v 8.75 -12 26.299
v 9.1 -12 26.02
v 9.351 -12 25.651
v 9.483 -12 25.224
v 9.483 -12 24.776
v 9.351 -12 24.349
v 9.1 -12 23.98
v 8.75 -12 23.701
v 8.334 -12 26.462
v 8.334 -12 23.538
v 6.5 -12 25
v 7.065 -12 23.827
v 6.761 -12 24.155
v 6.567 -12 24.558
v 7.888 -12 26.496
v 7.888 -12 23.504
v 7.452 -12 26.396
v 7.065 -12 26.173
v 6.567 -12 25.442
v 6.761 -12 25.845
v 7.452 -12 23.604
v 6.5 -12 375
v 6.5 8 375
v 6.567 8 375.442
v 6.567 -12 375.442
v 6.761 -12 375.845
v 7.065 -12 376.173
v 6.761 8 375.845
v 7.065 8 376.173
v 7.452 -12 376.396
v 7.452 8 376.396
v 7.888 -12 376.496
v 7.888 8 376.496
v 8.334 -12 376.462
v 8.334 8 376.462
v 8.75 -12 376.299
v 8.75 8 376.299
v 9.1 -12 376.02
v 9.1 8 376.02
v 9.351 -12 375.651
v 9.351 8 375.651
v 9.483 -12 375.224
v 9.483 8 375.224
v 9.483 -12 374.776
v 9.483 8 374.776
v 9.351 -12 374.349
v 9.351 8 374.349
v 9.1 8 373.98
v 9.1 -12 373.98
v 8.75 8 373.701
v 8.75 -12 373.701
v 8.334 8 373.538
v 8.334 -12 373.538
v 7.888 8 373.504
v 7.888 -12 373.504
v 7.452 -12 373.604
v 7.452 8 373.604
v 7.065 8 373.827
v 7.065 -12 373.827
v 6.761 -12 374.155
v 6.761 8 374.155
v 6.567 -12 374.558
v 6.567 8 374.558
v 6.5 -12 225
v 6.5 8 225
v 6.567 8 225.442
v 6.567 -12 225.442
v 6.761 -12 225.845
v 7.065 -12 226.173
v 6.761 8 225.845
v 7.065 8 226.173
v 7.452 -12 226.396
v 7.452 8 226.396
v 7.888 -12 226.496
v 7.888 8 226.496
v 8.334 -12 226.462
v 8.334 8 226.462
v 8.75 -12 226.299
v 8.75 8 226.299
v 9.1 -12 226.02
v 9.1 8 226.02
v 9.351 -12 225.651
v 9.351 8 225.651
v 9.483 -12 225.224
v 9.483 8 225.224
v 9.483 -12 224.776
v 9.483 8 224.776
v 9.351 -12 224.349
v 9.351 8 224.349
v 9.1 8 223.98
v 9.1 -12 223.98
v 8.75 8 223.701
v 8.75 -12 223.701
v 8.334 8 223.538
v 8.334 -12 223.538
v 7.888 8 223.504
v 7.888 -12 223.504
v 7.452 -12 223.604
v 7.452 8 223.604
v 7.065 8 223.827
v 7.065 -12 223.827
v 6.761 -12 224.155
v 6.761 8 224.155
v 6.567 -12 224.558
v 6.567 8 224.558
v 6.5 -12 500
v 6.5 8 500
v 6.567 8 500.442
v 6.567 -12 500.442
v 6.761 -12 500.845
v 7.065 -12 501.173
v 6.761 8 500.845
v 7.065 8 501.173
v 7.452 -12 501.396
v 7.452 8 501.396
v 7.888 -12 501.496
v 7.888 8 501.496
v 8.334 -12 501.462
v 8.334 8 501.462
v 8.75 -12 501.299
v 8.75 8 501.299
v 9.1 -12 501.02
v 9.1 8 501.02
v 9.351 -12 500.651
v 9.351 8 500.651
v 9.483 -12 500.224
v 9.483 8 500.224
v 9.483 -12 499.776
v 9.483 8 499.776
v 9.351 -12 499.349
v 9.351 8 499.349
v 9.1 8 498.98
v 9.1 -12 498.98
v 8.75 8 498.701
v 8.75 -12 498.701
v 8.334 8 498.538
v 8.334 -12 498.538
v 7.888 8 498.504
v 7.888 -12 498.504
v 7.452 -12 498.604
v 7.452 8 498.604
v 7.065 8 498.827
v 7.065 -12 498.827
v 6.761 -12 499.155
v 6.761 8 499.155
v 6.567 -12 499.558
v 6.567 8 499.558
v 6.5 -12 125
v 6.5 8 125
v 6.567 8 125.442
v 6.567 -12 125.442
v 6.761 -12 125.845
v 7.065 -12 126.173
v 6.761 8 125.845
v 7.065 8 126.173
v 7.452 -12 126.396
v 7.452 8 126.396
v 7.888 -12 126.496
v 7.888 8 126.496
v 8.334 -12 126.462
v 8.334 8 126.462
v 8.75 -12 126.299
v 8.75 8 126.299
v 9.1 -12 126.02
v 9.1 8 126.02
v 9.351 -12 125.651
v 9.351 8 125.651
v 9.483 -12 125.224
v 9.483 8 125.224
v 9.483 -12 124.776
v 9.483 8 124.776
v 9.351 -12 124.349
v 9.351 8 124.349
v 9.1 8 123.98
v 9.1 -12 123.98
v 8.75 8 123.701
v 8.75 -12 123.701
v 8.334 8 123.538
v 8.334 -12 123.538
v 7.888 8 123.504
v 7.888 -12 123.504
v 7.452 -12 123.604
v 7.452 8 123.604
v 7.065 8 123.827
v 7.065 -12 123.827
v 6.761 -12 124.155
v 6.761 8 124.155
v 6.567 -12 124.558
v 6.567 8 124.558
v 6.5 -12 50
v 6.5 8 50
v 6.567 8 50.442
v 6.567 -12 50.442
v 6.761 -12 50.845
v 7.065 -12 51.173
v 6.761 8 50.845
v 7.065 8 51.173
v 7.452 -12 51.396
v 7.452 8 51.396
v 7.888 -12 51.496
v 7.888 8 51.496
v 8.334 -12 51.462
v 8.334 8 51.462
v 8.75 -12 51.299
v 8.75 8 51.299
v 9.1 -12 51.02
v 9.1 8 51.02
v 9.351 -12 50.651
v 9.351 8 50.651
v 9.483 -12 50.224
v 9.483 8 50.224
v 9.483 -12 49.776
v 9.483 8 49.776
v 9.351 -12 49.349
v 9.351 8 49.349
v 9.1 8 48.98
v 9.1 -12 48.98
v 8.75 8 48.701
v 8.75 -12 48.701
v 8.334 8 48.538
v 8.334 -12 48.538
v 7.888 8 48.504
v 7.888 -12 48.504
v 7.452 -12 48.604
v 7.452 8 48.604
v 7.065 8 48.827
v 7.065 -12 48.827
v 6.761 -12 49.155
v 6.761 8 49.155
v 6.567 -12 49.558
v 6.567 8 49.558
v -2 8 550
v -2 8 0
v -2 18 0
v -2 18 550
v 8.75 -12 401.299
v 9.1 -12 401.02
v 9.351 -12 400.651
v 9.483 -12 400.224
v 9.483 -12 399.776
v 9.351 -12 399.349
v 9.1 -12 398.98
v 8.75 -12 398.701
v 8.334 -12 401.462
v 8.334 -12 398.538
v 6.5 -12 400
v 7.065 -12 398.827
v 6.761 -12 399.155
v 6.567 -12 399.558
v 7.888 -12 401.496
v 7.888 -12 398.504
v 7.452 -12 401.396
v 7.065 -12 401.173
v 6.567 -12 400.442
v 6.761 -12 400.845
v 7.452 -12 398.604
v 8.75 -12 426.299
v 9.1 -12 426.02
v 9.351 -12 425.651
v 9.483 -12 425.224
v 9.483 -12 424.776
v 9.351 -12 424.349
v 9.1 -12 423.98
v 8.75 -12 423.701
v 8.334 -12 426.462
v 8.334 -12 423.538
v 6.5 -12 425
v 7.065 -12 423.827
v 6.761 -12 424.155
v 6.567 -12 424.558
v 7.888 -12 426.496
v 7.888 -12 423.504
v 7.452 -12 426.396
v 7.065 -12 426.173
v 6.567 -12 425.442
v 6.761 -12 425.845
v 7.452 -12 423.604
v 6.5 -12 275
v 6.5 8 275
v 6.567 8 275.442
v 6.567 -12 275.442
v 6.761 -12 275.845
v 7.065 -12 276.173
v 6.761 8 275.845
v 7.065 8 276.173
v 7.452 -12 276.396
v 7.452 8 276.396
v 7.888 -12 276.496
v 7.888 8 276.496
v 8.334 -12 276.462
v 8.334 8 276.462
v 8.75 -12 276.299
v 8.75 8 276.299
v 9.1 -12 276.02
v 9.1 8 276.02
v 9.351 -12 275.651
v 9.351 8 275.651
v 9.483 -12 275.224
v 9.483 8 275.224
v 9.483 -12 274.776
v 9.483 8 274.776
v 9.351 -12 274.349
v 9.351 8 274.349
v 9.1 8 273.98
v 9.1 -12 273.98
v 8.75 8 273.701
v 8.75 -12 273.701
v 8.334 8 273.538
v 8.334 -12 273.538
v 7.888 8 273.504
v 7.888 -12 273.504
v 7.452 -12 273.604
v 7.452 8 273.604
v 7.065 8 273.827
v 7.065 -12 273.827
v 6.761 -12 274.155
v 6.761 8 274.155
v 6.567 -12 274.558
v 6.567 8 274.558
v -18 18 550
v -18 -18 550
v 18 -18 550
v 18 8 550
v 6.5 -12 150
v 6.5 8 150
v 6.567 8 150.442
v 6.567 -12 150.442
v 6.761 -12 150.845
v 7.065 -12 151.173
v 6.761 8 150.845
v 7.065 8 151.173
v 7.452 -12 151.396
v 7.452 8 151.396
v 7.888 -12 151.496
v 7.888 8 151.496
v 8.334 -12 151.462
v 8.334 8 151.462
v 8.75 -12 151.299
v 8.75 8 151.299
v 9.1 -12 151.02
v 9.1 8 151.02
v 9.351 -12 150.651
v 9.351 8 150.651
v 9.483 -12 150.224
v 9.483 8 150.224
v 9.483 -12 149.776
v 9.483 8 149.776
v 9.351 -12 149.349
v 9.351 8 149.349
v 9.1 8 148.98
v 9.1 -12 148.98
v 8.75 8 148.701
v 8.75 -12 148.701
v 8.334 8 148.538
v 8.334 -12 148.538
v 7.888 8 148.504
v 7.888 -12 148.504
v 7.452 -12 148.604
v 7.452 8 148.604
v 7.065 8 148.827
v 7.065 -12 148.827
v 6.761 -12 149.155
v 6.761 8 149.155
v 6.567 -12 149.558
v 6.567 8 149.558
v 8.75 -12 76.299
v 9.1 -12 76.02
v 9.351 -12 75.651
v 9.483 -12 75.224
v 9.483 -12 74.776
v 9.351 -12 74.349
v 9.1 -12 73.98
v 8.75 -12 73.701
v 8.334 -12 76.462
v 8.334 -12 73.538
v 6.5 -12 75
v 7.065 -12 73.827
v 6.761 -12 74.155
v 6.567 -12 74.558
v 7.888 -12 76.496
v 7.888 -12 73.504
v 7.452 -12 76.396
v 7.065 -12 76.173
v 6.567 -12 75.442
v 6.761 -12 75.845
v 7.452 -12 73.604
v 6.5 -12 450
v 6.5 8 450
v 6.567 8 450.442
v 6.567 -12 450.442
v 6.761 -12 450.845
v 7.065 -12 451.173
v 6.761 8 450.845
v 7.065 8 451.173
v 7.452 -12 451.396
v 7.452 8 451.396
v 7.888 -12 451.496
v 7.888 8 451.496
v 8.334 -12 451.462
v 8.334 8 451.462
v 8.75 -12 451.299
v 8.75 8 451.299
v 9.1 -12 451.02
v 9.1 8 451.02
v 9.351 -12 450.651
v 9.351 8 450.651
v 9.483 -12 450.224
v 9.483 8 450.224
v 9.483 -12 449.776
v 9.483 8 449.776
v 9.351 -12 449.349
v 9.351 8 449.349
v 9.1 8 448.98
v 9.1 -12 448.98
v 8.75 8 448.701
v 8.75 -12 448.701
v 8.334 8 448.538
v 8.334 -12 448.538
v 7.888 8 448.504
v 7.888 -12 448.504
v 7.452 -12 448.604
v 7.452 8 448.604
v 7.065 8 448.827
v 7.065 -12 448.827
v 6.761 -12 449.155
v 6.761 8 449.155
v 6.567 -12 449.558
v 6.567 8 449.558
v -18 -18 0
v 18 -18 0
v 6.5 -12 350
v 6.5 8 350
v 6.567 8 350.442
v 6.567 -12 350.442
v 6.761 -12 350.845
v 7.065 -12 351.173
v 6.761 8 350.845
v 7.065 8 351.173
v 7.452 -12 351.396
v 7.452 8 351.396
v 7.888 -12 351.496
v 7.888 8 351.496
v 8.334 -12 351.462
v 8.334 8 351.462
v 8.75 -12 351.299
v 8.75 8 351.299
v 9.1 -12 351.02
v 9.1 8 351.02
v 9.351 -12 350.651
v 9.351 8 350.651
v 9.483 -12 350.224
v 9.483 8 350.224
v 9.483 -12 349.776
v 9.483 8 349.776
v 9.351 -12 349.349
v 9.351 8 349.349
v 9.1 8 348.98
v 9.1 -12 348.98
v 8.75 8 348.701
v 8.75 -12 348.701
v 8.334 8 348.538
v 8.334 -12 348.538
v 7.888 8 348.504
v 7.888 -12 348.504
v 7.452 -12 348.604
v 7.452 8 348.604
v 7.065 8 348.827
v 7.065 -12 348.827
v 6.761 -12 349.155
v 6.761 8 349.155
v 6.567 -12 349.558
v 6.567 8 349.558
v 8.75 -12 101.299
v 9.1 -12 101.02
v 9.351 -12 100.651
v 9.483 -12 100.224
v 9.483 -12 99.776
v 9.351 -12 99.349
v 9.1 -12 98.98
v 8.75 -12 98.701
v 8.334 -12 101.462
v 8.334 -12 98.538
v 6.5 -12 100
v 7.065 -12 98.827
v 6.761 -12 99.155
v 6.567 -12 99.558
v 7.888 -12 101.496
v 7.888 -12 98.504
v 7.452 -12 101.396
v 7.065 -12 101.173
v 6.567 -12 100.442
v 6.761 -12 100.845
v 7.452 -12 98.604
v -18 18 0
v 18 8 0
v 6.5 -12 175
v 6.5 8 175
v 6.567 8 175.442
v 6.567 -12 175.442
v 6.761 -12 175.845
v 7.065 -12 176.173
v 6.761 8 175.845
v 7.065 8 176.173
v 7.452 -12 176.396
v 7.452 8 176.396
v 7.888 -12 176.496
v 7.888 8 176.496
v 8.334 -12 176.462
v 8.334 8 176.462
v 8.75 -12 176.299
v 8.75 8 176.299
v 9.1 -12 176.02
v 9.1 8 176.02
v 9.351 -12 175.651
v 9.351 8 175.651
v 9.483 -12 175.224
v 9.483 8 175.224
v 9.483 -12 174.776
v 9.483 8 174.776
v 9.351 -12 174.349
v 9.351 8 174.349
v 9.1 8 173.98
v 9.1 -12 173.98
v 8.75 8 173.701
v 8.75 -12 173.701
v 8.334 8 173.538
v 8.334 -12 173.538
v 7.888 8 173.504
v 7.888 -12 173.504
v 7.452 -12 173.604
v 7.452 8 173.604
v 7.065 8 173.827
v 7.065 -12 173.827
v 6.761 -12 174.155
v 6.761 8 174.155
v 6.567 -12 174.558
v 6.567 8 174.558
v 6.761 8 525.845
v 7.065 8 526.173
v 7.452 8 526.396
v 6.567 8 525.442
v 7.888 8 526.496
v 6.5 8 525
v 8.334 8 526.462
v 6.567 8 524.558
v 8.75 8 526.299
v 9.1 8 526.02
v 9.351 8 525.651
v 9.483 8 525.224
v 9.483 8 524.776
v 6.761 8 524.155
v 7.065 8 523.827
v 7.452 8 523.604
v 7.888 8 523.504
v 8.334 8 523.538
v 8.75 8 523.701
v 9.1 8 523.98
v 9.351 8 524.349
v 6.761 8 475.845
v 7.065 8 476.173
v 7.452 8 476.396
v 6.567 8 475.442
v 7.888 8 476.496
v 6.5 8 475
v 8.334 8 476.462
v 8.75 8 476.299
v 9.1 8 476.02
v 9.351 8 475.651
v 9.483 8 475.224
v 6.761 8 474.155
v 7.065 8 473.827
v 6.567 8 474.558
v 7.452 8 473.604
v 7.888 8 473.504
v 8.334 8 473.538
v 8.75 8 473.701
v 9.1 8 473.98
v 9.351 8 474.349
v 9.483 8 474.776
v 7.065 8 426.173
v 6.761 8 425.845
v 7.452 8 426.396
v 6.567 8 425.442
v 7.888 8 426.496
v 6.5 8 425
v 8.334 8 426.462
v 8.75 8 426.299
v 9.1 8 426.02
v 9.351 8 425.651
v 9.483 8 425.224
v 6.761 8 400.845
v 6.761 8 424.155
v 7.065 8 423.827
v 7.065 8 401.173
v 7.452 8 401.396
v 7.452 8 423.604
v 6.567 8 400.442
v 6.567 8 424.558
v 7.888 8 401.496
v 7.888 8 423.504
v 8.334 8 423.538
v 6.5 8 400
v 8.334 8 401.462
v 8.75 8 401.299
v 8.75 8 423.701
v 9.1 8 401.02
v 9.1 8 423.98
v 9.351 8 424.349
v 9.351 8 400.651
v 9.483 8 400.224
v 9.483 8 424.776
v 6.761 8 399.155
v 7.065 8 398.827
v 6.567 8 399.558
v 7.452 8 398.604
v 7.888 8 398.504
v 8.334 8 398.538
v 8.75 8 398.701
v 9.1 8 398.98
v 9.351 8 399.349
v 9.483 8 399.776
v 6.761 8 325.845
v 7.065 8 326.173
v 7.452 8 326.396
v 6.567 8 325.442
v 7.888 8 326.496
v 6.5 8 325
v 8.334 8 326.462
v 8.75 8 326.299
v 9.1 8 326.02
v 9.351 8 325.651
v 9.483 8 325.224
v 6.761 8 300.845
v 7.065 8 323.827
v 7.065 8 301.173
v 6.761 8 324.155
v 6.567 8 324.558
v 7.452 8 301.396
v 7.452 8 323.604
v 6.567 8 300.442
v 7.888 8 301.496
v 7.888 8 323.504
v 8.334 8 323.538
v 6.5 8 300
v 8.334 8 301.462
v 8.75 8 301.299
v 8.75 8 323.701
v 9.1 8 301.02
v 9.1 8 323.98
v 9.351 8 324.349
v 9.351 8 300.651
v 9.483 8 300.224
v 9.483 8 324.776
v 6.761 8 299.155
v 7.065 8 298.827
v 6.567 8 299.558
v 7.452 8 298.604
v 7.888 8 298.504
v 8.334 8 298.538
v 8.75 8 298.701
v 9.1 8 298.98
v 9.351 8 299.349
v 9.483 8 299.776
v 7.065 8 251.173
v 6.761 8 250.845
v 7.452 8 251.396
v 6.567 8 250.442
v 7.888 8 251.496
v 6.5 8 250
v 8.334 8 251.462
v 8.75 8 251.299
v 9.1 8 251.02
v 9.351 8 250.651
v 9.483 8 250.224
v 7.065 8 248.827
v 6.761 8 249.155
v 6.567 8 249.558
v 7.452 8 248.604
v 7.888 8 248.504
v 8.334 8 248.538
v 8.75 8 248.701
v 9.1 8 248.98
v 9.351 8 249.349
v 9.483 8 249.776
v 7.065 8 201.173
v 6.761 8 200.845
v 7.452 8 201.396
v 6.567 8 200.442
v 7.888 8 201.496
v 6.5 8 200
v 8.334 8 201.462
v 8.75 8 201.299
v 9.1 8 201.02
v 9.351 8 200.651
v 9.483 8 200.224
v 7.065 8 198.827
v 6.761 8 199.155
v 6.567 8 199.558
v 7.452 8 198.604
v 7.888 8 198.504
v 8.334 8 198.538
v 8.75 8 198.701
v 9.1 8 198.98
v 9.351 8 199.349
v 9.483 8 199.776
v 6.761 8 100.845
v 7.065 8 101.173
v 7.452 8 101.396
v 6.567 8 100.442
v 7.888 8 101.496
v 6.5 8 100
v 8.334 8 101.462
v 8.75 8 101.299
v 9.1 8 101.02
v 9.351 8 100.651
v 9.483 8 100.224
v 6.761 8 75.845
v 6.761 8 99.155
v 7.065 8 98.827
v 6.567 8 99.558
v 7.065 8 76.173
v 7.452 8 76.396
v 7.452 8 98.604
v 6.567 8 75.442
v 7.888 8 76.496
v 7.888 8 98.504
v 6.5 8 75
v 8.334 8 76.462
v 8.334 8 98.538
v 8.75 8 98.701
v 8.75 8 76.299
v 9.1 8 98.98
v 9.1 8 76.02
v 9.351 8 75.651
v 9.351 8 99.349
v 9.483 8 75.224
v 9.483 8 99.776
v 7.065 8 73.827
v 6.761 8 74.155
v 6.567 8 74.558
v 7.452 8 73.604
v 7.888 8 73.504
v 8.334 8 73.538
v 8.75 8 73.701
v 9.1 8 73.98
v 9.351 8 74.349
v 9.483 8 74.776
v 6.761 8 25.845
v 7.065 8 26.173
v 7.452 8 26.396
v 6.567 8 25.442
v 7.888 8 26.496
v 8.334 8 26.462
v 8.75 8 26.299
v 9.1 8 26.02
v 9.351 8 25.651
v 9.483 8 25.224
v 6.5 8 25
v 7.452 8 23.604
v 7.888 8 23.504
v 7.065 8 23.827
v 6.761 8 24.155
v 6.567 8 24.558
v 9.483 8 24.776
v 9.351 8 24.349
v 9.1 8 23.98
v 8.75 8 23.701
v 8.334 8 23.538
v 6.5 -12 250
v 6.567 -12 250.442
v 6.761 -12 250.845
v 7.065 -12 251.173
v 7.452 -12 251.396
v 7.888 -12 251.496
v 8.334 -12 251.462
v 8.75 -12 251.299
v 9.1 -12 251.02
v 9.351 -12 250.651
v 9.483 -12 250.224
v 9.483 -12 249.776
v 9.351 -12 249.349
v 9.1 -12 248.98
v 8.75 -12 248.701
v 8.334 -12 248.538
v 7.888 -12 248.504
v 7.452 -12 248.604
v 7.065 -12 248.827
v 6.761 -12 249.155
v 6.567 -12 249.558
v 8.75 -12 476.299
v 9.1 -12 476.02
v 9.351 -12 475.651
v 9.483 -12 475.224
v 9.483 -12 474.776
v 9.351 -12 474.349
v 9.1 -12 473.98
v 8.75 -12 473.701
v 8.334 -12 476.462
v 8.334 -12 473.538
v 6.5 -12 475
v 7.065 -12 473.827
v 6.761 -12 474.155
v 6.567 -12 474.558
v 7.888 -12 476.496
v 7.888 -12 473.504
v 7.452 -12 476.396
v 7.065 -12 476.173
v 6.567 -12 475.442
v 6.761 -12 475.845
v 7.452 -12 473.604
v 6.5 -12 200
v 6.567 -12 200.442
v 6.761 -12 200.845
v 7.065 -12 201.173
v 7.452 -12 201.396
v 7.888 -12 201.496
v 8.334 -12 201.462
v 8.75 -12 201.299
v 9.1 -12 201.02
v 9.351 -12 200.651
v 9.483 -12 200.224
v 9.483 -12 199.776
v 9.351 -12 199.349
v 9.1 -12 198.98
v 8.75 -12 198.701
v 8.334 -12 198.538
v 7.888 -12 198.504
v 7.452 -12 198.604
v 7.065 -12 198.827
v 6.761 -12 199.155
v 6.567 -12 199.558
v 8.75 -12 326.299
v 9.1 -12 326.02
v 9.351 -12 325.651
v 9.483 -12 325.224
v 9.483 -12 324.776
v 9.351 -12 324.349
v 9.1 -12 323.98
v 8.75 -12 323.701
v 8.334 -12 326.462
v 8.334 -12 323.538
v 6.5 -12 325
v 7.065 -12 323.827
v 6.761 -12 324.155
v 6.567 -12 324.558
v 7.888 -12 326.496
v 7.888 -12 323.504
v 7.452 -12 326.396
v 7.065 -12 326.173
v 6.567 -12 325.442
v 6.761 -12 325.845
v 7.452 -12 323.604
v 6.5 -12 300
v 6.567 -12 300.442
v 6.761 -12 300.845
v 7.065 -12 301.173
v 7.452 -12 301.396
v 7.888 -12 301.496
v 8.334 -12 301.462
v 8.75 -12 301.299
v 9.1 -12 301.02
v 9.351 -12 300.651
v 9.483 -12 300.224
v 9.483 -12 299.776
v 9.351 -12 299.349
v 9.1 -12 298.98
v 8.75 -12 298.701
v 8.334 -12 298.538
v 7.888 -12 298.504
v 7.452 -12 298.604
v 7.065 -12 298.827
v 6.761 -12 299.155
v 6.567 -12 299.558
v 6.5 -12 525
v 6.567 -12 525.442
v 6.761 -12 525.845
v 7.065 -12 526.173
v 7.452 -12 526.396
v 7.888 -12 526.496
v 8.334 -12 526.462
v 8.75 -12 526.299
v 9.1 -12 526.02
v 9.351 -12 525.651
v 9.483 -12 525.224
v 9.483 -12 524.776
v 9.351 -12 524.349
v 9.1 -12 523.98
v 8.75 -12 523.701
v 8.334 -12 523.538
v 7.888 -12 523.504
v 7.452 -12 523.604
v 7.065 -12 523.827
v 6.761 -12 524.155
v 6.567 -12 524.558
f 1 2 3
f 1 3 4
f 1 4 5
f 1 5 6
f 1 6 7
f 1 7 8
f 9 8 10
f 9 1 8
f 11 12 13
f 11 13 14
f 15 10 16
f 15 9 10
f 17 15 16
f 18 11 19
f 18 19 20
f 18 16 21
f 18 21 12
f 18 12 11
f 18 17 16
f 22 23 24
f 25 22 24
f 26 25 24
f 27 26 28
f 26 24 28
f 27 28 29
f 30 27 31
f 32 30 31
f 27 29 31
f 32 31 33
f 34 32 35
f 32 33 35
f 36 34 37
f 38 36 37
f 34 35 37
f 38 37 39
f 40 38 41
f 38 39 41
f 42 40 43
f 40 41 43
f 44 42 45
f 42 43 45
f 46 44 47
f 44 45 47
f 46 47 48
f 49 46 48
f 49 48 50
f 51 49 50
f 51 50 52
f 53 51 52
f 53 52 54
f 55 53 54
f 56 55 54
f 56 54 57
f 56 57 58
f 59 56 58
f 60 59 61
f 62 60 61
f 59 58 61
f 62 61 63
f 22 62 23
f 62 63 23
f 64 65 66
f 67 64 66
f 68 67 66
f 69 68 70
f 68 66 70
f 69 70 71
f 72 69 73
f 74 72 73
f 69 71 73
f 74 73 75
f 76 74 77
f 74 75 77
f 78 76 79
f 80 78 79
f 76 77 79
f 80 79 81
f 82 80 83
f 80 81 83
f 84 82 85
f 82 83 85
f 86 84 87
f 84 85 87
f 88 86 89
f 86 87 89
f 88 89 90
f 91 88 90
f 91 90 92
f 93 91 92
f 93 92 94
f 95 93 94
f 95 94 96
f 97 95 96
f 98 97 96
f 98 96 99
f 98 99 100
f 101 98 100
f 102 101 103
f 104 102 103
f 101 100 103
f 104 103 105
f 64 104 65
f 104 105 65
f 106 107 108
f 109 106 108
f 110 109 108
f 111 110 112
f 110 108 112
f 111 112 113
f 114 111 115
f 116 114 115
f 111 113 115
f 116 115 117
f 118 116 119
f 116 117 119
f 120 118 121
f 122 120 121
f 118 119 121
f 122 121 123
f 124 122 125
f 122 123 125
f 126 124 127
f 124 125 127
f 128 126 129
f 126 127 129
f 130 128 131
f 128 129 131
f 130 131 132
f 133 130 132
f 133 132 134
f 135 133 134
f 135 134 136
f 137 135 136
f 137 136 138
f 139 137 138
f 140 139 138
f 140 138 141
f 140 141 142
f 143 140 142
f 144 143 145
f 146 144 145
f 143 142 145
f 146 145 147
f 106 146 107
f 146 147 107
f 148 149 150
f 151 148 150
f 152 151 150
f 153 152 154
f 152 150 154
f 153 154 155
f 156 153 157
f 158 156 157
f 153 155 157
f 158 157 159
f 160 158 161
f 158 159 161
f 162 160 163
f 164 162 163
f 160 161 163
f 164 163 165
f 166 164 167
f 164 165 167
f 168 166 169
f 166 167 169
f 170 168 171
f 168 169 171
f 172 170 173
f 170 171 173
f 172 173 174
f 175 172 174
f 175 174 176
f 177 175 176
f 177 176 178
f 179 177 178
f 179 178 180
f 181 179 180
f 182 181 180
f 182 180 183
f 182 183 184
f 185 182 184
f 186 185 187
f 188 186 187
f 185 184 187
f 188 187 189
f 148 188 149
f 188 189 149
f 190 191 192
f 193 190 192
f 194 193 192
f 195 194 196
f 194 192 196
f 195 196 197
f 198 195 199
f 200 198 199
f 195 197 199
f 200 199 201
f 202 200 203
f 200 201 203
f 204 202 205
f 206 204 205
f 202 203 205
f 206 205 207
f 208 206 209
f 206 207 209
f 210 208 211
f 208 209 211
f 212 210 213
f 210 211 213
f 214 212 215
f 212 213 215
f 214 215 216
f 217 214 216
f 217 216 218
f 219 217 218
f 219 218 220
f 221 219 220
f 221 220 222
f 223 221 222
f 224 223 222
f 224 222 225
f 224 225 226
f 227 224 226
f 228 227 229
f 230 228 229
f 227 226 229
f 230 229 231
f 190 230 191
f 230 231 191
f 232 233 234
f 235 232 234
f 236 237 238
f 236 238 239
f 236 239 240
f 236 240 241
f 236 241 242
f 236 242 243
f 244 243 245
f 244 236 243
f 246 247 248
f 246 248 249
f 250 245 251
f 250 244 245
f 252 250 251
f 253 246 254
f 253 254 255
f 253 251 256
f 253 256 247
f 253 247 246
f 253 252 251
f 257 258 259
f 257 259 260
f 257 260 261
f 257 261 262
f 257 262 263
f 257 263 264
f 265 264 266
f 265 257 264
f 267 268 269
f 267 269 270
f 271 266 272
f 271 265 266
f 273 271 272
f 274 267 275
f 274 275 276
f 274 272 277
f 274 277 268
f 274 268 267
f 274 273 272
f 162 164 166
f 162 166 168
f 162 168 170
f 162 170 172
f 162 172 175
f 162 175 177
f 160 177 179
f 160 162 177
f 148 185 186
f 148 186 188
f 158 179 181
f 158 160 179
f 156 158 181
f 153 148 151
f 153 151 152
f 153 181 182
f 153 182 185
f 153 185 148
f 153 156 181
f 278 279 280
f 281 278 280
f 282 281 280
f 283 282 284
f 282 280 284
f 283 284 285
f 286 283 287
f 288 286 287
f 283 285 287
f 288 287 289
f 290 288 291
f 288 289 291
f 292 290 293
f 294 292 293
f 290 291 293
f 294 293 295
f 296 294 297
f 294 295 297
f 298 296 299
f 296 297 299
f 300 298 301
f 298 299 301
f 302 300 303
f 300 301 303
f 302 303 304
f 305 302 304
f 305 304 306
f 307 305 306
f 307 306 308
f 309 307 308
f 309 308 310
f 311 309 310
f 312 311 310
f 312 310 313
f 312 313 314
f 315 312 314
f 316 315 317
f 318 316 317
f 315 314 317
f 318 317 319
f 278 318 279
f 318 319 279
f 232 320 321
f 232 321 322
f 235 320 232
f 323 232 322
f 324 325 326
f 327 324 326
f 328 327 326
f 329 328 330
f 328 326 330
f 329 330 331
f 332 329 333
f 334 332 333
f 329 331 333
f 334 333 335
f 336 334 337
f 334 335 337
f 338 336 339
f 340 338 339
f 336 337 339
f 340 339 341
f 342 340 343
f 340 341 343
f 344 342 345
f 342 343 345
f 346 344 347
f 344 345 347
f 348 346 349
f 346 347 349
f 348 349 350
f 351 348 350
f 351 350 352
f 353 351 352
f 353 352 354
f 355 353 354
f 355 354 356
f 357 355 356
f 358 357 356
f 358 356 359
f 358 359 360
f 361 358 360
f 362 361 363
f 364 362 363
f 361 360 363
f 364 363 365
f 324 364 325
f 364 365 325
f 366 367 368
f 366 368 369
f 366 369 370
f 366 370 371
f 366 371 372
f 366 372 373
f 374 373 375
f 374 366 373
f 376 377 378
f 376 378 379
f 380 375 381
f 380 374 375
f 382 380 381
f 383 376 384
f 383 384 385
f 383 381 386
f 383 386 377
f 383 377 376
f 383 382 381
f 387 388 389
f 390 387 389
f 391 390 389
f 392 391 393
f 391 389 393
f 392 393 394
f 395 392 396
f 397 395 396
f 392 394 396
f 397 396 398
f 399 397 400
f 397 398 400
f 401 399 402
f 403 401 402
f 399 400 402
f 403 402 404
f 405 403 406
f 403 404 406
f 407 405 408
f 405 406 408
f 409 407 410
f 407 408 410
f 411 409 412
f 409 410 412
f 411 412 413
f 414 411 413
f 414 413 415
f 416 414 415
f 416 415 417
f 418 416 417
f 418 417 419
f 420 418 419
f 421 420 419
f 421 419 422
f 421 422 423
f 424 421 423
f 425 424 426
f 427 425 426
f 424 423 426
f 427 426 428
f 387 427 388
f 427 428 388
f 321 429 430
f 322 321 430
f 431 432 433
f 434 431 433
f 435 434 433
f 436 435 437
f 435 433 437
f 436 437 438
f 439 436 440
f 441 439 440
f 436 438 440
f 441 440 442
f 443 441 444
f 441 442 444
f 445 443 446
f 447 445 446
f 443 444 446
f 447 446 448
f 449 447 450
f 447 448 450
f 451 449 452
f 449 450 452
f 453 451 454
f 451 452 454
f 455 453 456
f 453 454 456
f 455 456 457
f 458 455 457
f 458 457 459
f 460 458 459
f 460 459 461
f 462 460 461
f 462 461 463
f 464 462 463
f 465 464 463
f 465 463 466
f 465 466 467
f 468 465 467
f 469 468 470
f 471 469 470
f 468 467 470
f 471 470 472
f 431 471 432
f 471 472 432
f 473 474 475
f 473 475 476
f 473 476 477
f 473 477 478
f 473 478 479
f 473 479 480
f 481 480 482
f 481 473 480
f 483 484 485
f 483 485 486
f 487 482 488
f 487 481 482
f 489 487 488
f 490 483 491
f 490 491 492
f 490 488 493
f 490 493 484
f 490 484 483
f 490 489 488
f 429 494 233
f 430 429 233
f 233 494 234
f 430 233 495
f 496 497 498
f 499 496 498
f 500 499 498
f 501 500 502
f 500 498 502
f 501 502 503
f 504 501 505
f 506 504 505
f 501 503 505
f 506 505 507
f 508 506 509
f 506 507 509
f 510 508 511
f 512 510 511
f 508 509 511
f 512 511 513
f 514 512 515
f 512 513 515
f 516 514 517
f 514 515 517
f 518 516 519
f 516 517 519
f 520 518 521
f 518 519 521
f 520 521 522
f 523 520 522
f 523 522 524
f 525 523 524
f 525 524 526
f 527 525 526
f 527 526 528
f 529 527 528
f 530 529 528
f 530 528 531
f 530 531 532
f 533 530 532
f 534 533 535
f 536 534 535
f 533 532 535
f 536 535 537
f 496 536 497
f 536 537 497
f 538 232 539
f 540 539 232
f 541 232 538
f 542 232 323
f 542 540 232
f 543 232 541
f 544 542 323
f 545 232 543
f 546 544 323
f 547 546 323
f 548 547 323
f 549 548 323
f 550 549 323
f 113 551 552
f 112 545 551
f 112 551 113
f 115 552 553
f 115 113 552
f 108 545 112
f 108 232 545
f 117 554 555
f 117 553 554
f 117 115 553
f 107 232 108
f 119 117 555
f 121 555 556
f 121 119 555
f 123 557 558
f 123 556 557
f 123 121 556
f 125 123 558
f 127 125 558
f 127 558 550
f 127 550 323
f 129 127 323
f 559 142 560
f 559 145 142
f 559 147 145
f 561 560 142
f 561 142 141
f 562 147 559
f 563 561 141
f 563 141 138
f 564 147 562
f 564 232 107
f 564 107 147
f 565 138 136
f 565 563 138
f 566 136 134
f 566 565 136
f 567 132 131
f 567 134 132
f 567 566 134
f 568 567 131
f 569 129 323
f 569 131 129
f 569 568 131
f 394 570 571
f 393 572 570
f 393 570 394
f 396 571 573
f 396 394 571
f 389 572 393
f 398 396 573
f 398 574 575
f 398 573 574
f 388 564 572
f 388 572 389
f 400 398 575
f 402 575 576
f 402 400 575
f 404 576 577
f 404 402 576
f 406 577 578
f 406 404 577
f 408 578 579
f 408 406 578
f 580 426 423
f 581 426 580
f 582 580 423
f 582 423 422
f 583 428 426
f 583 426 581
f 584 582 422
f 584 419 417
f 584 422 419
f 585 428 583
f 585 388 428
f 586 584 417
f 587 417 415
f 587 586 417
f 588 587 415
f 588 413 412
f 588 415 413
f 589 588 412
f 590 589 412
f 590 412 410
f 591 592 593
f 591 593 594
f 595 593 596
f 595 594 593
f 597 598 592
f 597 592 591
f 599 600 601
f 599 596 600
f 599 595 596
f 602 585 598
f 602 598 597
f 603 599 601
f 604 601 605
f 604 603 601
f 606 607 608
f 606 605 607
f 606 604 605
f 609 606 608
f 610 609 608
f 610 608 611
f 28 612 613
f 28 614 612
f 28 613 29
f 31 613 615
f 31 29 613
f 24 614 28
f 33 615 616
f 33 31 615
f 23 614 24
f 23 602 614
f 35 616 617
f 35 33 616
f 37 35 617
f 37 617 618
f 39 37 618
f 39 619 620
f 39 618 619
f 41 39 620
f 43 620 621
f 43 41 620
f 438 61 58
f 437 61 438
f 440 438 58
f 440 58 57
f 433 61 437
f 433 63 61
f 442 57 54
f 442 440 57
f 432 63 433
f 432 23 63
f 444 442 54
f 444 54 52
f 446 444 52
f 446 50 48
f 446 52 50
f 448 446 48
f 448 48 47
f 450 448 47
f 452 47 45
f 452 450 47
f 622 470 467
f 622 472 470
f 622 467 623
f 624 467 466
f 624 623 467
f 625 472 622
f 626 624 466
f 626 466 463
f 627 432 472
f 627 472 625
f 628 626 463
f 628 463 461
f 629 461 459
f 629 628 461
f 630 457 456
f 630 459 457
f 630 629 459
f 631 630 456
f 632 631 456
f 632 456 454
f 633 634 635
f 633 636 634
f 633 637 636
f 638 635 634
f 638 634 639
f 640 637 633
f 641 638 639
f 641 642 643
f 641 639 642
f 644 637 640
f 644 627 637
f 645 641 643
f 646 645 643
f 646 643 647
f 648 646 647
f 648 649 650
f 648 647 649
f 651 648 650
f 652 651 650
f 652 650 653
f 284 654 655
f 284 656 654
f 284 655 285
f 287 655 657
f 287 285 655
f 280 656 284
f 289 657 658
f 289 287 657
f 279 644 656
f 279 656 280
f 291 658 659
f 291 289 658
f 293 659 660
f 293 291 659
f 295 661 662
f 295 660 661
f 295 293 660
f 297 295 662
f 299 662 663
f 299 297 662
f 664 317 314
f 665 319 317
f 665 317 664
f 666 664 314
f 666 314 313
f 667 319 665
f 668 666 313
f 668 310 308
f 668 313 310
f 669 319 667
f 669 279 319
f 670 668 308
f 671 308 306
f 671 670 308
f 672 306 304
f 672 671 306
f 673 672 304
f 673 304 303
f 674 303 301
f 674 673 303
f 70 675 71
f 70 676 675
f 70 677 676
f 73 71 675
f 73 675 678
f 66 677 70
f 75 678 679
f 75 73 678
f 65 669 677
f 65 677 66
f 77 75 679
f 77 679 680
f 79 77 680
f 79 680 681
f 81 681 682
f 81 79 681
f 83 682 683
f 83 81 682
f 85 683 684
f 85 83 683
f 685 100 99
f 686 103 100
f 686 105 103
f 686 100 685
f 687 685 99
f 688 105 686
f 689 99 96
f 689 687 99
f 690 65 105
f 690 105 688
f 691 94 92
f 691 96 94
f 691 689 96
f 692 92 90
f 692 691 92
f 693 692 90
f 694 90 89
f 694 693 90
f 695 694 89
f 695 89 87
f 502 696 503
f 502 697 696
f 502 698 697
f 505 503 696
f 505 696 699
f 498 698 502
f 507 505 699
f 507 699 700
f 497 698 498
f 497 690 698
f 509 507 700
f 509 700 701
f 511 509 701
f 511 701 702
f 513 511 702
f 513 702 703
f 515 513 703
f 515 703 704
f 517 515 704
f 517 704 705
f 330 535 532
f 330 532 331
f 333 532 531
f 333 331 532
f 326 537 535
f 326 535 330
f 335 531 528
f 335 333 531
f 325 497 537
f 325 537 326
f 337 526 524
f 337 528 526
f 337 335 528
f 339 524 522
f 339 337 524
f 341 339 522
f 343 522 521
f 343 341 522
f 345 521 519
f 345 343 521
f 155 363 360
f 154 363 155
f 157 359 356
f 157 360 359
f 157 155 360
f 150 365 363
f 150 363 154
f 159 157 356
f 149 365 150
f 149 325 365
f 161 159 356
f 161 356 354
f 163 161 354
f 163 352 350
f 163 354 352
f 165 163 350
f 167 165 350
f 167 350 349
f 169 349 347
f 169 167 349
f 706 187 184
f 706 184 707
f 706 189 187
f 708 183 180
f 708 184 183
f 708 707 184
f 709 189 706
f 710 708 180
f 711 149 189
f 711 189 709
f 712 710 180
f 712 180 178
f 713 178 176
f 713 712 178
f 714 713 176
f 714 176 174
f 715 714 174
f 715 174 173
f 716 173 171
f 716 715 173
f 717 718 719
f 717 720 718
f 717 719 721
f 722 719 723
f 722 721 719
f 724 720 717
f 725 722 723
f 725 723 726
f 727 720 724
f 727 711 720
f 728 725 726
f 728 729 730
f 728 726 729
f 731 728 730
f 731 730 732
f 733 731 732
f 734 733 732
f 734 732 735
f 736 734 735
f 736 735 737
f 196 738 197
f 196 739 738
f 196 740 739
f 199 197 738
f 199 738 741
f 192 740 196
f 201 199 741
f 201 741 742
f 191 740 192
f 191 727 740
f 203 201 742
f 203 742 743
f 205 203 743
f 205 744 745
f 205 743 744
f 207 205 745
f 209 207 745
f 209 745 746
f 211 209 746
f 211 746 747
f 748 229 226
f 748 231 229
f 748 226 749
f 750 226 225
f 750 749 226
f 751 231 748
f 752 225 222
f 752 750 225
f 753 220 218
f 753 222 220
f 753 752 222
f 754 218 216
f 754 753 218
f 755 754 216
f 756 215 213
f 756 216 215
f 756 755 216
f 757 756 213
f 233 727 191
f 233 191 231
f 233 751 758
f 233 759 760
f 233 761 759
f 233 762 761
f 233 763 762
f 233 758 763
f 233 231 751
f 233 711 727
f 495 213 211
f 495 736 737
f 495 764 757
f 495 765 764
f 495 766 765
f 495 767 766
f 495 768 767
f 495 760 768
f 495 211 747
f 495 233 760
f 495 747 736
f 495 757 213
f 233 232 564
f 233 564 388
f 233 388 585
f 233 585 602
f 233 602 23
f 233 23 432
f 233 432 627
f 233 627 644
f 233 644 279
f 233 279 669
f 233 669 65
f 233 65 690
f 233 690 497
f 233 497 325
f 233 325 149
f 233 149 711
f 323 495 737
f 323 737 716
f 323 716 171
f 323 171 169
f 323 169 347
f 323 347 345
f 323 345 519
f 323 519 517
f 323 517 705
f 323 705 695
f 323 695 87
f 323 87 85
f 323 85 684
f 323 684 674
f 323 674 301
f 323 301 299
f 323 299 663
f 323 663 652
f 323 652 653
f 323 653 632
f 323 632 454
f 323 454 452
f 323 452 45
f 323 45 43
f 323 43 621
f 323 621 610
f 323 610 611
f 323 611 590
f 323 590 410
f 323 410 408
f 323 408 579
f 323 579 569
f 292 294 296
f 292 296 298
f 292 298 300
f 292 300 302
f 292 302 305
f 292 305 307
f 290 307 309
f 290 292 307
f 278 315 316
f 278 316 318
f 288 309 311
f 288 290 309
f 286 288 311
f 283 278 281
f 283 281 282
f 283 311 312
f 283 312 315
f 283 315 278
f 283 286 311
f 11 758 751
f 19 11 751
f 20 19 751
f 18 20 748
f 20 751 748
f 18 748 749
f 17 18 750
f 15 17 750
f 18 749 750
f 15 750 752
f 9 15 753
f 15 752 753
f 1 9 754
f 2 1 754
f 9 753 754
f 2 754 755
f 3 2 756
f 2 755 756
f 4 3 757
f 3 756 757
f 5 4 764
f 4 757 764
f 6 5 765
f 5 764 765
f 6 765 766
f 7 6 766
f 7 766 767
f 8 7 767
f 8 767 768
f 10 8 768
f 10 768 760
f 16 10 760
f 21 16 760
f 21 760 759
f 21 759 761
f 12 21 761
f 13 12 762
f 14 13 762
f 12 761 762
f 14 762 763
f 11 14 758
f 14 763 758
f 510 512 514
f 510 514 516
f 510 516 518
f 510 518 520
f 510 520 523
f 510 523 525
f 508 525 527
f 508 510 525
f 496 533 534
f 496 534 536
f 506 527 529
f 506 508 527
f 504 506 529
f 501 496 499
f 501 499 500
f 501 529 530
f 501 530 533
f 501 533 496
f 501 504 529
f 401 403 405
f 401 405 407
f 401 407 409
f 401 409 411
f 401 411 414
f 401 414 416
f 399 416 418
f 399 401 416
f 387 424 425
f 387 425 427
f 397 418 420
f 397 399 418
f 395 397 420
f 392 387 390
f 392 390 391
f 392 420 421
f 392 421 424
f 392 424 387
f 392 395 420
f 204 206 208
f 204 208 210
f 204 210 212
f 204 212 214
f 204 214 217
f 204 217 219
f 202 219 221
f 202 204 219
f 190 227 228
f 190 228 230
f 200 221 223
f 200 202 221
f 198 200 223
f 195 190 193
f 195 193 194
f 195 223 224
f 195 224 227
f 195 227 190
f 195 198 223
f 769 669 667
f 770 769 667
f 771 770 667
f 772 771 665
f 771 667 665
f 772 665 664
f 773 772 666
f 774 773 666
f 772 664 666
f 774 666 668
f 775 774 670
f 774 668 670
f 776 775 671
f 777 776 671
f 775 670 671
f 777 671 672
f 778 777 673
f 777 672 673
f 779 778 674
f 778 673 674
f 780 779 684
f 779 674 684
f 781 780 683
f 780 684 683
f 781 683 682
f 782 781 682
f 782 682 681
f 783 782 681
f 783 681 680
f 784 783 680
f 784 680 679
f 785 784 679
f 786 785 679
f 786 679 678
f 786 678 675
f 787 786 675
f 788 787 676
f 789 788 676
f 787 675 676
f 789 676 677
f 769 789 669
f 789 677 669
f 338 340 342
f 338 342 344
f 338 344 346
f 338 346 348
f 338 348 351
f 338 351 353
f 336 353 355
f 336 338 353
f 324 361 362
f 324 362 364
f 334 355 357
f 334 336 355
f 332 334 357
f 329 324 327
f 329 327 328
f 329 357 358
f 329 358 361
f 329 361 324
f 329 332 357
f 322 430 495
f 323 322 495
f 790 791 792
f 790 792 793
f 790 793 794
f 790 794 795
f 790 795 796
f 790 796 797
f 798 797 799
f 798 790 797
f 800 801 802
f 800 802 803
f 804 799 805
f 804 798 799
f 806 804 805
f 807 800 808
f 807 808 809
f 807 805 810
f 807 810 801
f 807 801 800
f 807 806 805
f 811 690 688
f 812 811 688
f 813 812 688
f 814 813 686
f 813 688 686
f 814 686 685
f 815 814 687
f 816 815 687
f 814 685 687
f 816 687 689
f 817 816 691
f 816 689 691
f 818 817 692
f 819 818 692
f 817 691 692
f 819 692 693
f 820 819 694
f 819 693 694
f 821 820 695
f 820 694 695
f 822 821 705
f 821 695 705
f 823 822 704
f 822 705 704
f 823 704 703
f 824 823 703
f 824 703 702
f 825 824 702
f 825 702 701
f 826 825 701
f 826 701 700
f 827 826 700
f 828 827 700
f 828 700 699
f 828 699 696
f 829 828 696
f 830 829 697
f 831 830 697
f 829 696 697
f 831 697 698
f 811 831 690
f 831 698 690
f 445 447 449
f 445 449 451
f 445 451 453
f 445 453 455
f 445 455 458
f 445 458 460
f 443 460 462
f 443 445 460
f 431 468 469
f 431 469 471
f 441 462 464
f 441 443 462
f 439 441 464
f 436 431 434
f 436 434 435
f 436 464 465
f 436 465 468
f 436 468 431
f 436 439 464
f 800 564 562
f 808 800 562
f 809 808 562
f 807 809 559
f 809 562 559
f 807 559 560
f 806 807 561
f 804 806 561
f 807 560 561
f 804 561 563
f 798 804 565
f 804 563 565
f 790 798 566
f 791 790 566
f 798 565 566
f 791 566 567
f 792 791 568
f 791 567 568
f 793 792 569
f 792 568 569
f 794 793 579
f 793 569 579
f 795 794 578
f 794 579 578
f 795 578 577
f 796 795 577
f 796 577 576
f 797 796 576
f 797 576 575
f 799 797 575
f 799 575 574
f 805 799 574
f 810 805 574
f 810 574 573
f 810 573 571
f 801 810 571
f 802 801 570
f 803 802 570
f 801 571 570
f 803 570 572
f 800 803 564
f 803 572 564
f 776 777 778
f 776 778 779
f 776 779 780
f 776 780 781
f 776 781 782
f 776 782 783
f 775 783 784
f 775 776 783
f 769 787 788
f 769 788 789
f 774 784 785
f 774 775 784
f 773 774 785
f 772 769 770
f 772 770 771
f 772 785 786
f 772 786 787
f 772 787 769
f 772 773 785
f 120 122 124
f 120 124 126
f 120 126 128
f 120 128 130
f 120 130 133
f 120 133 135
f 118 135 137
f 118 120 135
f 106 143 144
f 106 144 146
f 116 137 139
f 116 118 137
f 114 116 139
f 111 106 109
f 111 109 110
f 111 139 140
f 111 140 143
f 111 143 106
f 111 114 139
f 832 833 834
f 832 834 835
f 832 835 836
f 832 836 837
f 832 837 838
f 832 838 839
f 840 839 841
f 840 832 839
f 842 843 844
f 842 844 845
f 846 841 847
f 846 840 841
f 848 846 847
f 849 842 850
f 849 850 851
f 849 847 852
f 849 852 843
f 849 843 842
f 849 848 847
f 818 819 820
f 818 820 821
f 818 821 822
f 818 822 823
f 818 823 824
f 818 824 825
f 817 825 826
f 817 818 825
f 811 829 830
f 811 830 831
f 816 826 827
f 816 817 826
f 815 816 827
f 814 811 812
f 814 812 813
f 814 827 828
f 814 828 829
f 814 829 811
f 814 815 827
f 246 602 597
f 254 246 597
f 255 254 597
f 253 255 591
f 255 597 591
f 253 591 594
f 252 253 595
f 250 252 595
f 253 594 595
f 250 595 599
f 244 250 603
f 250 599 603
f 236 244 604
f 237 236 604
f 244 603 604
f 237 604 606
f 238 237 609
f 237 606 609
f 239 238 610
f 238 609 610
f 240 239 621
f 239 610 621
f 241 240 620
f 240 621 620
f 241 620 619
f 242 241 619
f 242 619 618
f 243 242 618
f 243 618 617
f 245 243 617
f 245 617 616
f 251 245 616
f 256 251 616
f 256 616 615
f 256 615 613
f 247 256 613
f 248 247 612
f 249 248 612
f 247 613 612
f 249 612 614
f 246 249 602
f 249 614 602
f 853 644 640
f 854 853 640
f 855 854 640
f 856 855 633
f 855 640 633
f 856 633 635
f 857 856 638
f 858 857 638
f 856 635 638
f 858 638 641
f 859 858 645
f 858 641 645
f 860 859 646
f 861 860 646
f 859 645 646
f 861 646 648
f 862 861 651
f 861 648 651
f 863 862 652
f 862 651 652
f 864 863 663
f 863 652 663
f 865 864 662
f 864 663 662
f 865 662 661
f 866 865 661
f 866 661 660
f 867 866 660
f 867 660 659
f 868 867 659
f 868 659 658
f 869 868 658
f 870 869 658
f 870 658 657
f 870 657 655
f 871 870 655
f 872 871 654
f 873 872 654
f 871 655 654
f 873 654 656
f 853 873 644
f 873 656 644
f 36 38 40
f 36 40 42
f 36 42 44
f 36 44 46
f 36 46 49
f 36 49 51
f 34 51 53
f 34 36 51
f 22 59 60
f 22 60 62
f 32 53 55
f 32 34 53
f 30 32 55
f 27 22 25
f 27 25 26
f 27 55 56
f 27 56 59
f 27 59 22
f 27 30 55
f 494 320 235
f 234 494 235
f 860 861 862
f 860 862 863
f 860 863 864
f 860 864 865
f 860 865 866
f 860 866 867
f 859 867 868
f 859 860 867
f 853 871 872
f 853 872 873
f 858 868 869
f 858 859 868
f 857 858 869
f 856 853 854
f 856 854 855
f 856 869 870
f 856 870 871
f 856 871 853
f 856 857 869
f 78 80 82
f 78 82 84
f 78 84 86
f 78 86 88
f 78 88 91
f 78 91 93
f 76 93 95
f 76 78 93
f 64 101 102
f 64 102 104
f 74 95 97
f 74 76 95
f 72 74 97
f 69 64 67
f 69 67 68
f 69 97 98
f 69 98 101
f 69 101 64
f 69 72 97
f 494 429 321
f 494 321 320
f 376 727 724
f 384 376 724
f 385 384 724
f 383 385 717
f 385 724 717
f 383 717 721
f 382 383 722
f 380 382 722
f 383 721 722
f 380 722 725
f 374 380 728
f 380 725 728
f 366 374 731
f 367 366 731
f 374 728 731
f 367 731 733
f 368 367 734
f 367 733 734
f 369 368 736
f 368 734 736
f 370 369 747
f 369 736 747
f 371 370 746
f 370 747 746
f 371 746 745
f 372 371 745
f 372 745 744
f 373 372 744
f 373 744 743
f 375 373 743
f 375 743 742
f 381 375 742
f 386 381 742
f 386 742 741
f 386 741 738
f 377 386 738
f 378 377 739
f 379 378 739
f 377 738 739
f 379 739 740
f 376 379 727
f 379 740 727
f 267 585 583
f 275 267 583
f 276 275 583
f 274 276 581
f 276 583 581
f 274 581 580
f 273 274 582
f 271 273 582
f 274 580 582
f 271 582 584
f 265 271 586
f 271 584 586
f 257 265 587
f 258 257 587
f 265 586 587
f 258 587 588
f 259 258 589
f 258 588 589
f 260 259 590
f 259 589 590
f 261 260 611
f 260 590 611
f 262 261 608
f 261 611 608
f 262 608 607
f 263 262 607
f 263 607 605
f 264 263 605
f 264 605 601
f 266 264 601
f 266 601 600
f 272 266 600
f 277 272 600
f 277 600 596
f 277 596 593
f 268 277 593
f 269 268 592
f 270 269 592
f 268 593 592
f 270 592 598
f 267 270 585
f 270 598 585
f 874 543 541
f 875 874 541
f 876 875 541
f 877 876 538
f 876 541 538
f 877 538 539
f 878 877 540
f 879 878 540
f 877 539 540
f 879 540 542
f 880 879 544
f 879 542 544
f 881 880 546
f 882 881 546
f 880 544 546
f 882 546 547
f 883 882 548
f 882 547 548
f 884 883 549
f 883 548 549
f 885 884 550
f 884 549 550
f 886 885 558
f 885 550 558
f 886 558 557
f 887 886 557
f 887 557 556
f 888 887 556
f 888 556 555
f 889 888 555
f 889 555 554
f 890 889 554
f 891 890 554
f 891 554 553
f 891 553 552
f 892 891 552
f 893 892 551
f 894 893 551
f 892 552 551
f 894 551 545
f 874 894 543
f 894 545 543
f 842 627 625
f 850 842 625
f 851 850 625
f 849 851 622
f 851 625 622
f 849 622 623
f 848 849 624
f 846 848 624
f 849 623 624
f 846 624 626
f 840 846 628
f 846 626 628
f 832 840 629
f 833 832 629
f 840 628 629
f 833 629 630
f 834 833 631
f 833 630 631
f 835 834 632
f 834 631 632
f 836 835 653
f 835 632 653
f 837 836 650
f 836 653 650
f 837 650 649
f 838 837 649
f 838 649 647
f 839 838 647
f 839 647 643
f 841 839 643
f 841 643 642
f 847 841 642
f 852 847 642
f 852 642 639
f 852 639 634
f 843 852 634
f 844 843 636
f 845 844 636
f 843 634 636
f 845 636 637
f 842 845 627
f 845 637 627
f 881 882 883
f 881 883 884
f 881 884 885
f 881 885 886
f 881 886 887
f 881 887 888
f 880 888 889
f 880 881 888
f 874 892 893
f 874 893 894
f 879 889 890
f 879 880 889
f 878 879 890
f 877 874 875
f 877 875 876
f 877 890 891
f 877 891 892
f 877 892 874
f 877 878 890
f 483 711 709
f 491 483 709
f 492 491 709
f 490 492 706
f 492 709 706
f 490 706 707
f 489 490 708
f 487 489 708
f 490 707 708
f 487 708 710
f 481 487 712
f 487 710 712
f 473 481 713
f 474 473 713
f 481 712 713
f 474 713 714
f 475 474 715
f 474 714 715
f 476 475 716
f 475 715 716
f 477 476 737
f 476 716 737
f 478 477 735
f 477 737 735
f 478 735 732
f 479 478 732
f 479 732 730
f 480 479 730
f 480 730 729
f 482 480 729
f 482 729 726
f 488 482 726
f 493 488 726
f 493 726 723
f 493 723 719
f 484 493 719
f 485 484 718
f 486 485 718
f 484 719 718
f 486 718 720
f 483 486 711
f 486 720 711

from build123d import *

# Parameters (mm, degrees)
ESQUISSE1_W                    = 36
ESQUISSE1_H                    = 36
BOSS_EXTRU_1_DEPTH             = 550
ENL_V_MAT_EXTRU_1_DEPTH        = 551.588775766
ENL_V_MAT_EXTRU_1_DEPTH_BACK   = 551.588775766
ESQUISSE2_W                    = 20
ESQUISSE2_H                    = 10
ESQUISSE3_R                    = 1.5
ENL_V_MAT_EXTRU_2_DEPTH        = 20
R_P_TITION_LIN_AIRE1_COUNT     = 11
R_P_TITION_LIN_AIRE1_PITCH     = 25
R_P_TITION_LIN_AIRE1_COL_COUNT = 11
R_P_TITION_LIN_AIRE1_COL_PITCH = 25


with BuildPart() as part:
    # Esquisse1 → Boss.-Extru.1 (new body)
    with BuildSketch(Plane.XY):
        Rectangle(ESQUISSE1_W, ESQUISSE1_H)
    extrude(amount=BOSS_EXTRU_1_DEPTH)

    # Esquisse2 → Enlèv. mat.-Extru.1 (cut, two sides: drawn at the far end of the back side and taken through both)
    with BuildSketch(Plane.XY.offset(550).offset(-ENL_V_MAT_EXTRU_1_DEPTH_BACK)):
        with Locations((8, 13)):
            Rectangle(ESQUISSE2_W, ESQUISSE2_H)
    extrude(amount=ENL_V_MAT_EXTRU_1_DEPTH + ENL_V_MAT_EXTRU_1_DEPTH_BACK, mode=Mode.SUBTRACT)

    # Esquisse3 → Enlèv. mat.-Extru.2 (cut)
    with BuildSketch(Plane(origin=(0, 8, 0), x_dir=(1, 0, 0), z_dir=(0, 1, 0))):
        with Locations(Location((8, -275, 0), (0, 0, 180))):
            Circle(ESQUISSE3_R)
    enl_v_mat_extru_2 = extrude(amount=-ENL_V_MAT_EXTRU_2_DEPTH, mode=Mode.SUBTRACT)

    # Répétition linéaire1: Enlèv. mat.-Extru.2 ×11
    with Locations(*[(0, 0, -i * R_P_TITION_LIN_AIRE1_PITCH) for i in range(1, R_P_TITION_LIN_AIRE1_COUNT)]):
        add(enl_v_mat_extru_2, mode=Mode.SUBTRACT)

    # Répétition linéaire1 col: Enlèv. mat.-Extru.2 ×11
    with Locations(*[(0, 0, i * R_P_TITION_LIN_AIRE1_COL_PITCH) for i in range(1, R_P_TITION_LIN_AIRE1_COL_COUNT)]):
        add(enl_v_mat_extru_2, mode=Mode.SUBTRACT)


solid = part.part
